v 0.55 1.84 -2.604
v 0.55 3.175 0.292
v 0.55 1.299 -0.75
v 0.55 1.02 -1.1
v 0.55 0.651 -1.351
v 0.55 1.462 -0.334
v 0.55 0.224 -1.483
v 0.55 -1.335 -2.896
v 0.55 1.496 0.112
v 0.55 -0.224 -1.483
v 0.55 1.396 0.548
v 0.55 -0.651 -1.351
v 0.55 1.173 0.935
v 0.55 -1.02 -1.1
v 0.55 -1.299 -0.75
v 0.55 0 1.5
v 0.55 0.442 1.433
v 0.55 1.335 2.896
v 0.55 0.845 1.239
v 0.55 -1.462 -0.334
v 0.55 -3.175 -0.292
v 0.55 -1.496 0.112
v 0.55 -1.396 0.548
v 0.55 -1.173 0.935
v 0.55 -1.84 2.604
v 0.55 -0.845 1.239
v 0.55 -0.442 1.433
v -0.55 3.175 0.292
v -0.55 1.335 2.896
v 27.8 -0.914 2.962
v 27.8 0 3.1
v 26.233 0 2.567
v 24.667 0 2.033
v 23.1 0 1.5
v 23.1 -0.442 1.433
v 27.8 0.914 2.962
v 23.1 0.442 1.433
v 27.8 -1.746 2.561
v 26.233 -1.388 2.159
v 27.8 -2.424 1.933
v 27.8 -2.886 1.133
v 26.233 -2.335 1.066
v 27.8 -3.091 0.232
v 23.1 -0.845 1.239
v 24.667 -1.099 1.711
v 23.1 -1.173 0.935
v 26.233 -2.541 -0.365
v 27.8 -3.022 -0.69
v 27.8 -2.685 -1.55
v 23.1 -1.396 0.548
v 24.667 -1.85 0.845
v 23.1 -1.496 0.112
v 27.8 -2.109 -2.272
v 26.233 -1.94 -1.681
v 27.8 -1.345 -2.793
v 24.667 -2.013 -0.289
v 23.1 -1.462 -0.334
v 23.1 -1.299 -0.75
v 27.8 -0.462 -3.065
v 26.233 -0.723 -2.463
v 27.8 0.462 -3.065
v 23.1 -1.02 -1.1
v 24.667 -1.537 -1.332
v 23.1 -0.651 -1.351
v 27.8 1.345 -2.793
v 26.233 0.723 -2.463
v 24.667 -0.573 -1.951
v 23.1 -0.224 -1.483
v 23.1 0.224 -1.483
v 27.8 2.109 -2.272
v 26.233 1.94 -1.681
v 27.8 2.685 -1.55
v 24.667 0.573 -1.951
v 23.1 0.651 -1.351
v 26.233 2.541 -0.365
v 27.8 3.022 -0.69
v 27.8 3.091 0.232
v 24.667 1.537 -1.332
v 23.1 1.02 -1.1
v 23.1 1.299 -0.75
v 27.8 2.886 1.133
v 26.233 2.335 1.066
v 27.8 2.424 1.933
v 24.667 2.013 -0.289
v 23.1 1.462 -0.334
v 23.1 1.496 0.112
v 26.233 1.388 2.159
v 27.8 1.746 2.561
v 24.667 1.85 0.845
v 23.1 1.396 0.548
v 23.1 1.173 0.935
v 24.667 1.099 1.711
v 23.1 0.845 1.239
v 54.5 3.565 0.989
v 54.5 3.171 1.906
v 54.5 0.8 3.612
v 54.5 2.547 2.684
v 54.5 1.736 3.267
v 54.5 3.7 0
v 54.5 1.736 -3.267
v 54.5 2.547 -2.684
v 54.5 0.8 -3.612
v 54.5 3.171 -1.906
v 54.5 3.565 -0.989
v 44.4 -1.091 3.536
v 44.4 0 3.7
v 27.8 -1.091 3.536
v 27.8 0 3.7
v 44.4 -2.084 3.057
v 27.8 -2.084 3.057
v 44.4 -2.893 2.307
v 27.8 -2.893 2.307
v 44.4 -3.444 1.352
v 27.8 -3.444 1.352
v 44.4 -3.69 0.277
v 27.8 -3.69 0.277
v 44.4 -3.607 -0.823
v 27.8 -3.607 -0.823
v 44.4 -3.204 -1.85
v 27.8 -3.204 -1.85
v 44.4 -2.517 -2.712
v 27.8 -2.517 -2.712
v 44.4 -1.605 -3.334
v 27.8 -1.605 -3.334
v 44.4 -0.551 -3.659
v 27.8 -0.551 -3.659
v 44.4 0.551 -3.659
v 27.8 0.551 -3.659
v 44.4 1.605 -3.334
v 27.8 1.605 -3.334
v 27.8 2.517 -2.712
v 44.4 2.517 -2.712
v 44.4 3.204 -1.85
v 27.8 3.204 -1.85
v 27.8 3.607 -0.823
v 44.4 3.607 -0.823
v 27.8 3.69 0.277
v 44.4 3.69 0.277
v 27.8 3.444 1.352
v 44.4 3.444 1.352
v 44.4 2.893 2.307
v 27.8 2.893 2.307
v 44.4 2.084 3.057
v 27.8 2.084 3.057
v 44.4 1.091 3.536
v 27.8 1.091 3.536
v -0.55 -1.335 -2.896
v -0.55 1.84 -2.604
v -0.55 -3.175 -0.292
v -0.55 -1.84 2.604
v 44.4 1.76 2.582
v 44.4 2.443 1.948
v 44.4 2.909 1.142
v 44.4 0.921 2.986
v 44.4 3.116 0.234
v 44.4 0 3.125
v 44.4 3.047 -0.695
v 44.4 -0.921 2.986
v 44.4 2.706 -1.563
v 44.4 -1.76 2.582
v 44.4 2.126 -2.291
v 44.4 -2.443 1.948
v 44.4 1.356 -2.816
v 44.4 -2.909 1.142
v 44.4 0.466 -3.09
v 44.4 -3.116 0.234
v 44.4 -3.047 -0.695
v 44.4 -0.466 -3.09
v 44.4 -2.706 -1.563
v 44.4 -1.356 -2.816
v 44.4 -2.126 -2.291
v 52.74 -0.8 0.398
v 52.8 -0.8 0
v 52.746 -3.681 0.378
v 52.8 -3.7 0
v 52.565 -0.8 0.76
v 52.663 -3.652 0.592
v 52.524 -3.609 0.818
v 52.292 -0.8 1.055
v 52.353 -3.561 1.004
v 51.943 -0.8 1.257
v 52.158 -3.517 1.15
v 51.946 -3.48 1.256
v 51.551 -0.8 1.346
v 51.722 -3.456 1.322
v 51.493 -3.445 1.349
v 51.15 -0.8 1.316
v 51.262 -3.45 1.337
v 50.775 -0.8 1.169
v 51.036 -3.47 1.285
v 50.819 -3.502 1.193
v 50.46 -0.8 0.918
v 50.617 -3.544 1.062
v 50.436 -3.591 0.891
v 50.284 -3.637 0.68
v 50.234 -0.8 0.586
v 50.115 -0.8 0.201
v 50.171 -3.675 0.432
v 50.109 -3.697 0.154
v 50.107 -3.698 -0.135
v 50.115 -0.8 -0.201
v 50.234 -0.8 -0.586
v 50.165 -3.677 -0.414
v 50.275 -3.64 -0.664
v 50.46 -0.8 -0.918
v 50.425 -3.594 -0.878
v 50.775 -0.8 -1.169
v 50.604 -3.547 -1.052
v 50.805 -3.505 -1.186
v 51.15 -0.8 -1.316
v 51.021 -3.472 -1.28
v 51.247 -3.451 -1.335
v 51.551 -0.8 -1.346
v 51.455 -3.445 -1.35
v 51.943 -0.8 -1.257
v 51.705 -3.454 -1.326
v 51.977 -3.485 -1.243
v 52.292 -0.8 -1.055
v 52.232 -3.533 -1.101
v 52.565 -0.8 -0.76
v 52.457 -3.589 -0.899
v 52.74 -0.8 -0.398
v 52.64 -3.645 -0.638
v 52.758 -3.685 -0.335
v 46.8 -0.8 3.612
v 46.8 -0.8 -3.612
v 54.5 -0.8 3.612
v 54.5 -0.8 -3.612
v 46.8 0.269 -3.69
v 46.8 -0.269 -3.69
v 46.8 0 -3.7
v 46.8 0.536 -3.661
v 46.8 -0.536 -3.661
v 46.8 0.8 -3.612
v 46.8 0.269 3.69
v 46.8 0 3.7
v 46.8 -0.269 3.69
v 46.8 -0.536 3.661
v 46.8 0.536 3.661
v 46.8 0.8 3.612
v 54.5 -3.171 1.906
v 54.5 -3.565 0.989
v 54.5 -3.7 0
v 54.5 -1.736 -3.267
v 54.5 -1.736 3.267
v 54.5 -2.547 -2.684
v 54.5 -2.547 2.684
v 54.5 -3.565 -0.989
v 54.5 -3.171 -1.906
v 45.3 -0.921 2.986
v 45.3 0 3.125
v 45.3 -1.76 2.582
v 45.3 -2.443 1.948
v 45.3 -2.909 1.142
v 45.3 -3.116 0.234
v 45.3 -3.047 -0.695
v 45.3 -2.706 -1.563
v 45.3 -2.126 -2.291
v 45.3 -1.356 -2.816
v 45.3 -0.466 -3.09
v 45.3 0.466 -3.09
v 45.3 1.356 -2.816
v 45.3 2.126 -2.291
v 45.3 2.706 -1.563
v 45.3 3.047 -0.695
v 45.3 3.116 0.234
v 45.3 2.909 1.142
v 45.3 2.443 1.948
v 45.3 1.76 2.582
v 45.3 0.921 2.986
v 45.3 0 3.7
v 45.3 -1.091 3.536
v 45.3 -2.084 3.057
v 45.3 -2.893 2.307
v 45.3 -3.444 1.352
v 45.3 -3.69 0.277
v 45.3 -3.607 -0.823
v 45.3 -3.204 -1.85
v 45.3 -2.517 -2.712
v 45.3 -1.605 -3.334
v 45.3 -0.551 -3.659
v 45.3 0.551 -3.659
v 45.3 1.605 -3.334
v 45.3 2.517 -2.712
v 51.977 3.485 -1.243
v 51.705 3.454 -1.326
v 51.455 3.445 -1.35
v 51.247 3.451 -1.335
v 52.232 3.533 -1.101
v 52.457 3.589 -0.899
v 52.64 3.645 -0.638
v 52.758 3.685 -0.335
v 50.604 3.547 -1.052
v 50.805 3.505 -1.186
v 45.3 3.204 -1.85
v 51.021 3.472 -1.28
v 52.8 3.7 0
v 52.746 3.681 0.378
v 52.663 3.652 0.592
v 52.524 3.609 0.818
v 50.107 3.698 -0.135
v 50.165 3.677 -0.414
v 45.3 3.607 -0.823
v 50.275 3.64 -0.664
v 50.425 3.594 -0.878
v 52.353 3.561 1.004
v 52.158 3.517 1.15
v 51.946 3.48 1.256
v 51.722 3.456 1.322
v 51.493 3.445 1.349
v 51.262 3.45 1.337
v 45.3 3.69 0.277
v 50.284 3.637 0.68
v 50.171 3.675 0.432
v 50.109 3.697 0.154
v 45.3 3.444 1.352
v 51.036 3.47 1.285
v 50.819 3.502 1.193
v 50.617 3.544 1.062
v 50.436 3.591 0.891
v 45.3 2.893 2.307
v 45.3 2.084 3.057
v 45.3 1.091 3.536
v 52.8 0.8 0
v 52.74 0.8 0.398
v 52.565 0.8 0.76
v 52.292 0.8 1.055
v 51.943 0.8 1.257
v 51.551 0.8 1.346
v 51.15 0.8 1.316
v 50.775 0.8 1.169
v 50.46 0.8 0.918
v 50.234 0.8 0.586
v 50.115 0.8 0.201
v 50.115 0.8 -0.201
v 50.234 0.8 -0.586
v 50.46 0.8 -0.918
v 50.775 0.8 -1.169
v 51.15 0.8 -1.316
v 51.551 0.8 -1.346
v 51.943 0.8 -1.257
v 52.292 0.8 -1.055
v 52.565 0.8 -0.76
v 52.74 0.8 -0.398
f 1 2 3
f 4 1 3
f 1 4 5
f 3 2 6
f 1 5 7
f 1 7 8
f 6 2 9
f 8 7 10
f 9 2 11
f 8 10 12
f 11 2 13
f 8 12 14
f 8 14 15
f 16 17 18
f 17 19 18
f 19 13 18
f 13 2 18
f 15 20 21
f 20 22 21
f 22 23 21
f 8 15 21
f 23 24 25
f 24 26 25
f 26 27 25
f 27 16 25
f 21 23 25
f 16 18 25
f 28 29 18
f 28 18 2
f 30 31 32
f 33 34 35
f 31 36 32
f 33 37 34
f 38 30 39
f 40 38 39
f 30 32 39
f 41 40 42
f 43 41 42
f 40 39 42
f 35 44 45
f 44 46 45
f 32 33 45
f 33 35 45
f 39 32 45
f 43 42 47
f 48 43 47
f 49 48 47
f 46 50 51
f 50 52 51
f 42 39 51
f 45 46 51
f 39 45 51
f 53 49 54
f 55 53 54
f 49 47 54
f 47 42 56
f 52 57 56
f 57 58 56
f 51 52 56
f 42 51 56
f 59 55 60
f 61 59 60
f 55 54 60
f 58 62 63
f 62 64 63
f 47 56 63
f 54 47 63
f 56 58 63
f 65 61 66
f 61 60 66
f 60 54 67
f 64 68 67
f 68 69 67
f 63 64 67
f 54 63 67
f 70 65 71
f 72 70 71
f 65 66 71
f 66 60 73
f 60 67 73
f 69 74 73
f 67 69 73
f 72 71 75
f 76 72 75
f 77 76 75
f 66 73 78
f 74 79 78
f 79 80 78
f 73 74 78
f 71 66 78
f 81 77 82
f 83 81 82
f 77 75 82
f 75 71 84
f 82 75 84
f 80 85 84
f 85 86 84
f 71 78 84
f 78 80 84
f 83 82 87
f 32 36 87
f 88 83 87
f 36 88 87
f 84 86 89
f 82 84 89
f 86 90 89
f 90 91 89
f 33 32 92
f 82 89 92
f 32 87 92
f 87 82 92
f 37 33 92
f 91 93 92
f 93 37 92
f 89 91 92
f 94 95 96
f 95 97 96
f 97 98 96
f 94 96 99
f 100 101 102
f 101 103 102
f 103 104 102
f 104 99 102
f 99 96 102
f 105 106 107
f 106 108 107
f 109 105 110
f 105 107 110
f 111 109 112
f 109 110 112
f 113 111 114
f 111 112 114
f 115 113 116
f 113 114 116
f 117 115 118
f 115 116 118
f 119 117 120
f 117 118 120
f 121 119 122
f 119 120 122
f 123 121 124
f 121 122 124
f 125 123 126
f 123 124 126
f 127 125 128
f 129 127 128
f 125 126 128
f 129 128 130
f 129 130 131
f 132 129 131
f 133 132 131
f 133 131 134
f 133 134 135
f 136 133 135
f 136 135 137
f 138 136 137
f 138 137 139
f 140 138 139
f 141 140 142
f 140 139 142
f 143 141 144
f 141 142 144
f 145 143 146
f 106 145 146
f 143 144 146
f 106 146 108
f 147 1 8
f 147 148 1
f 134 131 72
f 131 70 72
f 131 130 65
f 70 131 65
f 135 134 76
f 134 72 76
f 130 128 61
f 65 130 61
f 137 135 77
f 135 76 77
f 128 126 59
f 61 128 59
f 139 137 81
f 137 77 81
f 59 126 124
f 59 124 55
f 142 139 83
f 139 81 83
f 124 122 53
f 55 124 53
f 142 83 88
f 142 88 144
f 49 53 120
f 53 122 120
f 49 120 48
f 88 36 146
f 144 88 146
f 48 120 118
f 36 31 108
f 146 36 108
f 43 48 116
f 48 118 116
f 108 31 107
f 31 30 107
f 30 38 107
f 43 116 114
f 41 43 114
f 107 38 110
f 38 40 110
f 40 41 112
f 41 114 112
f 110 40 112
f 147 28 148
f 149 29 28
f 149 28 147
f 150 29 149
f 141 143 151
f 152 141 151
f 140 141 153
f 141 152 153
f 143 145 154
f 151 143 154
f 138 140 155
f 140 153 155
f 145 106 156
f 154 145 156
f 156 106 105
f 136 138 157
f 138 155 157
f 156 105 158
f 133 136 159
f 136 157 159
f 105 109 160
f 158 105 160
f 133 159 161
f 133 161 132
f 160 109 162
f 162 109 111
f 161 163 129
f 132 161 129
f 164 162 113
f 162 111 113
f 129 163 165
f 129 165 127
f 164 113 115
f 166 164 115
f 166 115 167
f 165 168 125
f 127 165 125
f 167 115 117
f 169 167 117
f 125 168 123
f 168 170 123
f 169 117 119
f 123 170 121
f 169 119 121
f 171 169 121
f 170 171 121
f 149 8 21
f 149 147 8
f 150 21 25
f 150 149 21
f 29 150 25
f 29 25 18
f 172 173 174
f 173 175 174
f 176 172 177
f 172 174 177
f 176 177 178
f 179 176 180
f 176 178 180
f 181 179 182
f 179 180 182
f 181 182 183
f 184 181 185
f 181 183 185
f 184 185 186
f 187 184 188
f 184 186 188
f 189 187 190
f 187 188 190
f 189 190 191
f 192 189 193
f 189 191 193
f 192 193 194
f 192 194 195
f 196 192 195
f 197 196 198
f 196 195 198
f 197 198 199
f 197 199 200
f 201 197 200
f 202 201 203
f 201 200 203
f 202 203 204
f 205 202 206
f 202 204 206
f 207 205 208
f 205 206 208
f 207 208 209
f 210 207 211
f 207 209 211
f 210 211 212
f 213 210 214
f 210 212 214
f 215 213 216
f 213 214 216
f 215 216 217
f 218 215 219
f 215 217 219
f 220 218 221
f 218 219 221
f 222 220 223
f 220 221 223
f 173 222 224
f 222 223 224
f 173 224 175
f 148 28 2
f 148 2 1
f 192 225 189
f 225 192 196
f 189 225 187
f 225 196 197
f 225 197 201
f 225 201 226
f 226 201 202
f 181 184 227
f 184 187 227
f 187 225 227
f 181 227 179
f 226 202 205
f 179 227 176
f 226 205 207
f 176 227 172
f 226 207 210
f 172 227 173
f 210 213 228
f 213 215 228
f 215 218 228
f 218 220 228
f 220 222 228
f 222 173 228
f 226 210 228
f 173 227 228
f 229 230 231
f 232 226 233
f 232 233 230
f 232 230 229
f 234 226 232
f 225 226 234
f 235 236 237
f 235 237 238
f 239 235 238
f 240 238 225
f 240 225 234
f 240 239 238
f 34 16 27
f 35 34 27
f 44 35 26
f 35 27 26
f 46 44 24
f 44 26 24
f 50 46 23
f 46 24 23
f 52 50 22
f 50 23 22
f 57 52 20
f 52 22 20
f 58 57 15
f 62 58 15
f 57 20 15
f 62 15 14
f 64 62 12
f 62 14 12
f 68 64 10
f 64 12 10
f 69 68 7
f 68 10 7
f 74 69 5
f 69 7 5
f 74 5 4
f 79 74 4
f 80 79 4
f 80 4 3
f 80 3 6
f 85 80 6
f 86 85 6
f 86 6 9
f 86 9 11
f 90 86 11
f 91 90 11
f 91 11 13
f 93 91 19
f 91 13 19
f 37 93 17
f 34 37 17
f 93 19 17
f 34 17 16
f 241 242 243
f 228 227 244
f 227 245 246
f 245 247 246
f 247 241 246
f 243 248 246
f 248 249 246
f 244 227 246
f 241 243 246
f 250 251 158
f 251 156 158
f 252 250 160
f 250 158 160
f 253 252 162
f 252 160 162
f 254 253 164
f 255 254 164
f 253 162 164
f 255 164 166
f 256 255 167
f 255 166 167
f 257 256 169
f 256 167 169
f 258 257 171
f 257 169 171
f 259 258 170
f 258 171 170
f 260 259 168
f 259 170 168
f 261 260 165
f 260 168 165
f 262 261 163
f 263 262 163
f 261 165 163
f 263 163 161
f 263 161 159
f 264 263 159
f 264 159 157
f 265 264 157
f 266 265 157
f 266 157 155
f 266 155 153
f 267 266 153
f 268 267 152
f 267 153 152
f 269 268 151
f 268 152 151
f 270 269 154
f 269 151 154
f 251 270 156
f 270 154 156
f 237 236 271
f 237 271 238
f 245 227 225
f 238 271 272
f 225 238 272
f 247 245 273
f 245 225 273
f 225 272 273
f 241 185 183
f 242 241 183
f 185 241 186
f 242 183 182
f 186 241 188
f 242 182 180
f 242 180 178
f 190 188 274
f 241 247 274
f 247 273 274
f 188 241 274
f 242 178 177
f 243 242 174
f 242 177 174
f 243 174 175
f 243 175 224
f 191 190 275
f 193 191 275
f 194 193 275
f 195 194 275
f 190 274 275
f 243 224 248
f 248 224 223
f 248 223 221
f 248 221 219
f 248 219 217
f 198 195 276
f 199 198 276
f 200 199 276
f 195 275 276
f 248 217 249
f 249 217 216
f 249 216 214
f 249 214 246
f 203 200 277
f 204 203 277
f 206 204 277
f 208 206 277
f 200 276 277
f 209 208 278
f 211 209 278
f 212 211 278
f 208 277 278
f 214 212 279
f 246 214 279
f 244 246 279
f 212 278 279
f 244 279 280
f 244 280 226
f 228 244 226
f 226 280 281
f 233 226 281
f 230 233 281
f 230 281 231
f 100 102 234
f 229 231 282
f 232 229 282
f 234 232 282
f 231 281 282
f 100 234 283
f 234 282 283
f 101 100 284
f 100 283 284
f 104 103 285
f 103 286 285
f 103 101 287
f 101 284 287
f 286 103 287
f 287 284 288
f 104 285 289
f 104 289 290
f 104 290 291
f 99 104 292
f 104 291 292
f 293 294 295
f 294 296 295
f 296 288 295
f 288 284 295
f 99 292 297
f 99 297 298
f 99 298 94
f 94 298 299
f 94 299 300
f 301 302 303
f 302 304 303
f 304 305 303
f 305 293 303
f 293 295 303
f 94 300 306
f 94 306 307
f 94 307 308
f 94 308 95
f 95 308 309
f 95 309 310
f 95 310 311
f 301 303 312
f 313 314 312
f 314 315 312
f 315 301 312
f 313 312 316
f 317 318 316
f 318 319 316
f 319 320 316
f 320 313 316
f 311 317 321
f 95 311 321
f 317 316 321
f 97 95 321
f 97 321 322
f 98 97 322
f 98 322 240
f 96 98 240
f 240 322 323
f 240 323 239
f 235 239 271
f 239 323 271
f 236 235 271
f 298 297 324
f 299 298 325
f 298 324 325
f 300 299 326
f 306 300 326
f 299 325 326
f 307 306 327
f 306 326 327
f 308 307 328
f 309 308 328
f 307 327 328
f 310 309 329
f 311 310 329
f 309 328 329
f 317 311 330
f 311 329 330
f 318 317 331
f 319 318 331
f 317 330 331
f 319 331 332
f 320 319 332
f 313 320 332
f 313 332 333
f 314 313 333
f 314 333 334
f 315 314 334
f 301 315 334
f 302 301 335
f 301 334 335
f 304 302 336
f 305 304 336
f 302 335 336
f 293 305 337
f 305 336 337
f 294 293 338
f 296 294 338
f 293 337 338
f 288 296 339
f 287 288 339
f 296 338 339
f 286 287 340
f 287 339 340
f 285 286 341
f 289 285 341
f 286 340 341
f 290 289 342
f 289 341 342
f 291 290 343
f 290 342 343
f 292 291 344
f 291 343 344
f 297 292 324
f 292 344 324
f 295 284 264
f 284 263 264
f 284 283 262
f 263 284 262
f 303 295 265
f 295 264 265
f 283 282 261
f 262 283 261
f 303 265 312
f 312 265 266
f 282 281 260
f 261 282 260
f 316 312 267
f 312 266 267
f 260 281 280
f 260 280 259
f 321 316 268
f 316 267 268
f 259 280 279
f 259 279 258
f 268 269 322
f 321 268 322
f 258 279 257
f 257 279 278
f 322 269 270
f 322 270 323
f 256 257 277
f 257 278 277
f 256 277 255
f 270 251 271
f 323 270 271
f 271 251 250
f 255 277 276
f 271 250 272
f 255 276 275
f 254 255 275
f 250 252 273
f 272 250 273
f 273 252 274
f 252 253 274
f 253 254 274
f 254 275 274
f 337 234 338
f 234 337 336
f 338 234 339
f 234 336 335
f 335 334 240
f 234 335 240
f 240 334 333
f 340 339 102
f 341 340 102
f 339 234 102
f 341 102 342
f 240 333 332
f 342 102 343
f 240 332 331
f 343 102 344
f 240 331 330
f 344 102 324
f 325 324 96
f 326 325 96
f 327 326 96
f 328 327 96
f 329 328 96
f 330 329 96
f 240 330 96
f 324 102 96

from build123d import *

# Parameters (mm, degrees)
F3_DEPTH = 7.7
F4_R     = 1.35
F5_DEPTH = 12.5
F7_DEPTH = 0.55


with BuildPart() as f1:
    # F0 (on Front) → F1 (revolve)
    with BuildSketch(Plane.XZ):
        Polygon((0, 1.5), (0, 0), (54.5, 0), (54.5, 3.7), (45.3, 3.7), (45.3, 3.125), (44.4, 3.125), (44.4, 3.7), (27.8, 3.7), (27.8, 3.1), (23.1, 1.5), align=None)
    revolve(axis=Axis((27.25, 0, 0), (1, 0, 0)))

    # F2 (on face) → F3 (cut)
    with BuildSketch(Plane.YZ.offset(54.5)):
        with BuildLine():
            Line((0, -3.7), (0, 0))
            Line((0, 0), (0, 3.7))
            ThreePointArc((0, 3.7), (-0.4023866409, 3.6780545117), (-0.8, 3.6124783736))
            Line((-0.8, 3.6124783736), (-0.8, -3.6124783736))
            ThreePointArc((-0.8, -3.6124783736), (-0.4023866409, -3.6780545117), (0, -3.7))
        make_face()
        with BuildLine():
            Line((0, 3.7), (0, 0))
            Line((0, 0), (0, -3.7))
            ThreePointArc((0, -3.7), (0.4023866409, -3.6780545117), (0.8, -3.6124783736))
            Line((0.8, -3.6124783736), (0.8, 3.6124783736))
            ThreePointArc((0.8, 3.6124783736), (0.4023866409, 3.6780545117), (0, 3.7))
        make_face()
    extrude(amount=-F3_DEPTH, mode=Mode.SUBTRACT)

    # F4 (on Front) → F5 (cut, symmetric)
    with BuildSketch(Plane.XZ):
        with Locations((51.45, 0)):
            Circle(F4_R)
    extrude(amount=F5_DEPTH, both=True, mode=Mode.SUBTRACT)

    # F6 (on face) → F7 (join, symmetric)
    with BuildSketch(Plane(origin=(0, 0, 0), x_dir=(0, -1, 0), z_dir=(-1, 0, 0))):
        Polygon((3.1754264805, -0.2916945049), (1.8403280916, 2.6041527476), (-1.3350983889, 2.8958472524), (-3.1754264805, 0.2916945049), (-1.8403280916, -2.6041527476), (1.3350983889, -2.8958472524), align=None)
    extrude(amount=F7_DEPTH, both=True)


solid = f1.part
